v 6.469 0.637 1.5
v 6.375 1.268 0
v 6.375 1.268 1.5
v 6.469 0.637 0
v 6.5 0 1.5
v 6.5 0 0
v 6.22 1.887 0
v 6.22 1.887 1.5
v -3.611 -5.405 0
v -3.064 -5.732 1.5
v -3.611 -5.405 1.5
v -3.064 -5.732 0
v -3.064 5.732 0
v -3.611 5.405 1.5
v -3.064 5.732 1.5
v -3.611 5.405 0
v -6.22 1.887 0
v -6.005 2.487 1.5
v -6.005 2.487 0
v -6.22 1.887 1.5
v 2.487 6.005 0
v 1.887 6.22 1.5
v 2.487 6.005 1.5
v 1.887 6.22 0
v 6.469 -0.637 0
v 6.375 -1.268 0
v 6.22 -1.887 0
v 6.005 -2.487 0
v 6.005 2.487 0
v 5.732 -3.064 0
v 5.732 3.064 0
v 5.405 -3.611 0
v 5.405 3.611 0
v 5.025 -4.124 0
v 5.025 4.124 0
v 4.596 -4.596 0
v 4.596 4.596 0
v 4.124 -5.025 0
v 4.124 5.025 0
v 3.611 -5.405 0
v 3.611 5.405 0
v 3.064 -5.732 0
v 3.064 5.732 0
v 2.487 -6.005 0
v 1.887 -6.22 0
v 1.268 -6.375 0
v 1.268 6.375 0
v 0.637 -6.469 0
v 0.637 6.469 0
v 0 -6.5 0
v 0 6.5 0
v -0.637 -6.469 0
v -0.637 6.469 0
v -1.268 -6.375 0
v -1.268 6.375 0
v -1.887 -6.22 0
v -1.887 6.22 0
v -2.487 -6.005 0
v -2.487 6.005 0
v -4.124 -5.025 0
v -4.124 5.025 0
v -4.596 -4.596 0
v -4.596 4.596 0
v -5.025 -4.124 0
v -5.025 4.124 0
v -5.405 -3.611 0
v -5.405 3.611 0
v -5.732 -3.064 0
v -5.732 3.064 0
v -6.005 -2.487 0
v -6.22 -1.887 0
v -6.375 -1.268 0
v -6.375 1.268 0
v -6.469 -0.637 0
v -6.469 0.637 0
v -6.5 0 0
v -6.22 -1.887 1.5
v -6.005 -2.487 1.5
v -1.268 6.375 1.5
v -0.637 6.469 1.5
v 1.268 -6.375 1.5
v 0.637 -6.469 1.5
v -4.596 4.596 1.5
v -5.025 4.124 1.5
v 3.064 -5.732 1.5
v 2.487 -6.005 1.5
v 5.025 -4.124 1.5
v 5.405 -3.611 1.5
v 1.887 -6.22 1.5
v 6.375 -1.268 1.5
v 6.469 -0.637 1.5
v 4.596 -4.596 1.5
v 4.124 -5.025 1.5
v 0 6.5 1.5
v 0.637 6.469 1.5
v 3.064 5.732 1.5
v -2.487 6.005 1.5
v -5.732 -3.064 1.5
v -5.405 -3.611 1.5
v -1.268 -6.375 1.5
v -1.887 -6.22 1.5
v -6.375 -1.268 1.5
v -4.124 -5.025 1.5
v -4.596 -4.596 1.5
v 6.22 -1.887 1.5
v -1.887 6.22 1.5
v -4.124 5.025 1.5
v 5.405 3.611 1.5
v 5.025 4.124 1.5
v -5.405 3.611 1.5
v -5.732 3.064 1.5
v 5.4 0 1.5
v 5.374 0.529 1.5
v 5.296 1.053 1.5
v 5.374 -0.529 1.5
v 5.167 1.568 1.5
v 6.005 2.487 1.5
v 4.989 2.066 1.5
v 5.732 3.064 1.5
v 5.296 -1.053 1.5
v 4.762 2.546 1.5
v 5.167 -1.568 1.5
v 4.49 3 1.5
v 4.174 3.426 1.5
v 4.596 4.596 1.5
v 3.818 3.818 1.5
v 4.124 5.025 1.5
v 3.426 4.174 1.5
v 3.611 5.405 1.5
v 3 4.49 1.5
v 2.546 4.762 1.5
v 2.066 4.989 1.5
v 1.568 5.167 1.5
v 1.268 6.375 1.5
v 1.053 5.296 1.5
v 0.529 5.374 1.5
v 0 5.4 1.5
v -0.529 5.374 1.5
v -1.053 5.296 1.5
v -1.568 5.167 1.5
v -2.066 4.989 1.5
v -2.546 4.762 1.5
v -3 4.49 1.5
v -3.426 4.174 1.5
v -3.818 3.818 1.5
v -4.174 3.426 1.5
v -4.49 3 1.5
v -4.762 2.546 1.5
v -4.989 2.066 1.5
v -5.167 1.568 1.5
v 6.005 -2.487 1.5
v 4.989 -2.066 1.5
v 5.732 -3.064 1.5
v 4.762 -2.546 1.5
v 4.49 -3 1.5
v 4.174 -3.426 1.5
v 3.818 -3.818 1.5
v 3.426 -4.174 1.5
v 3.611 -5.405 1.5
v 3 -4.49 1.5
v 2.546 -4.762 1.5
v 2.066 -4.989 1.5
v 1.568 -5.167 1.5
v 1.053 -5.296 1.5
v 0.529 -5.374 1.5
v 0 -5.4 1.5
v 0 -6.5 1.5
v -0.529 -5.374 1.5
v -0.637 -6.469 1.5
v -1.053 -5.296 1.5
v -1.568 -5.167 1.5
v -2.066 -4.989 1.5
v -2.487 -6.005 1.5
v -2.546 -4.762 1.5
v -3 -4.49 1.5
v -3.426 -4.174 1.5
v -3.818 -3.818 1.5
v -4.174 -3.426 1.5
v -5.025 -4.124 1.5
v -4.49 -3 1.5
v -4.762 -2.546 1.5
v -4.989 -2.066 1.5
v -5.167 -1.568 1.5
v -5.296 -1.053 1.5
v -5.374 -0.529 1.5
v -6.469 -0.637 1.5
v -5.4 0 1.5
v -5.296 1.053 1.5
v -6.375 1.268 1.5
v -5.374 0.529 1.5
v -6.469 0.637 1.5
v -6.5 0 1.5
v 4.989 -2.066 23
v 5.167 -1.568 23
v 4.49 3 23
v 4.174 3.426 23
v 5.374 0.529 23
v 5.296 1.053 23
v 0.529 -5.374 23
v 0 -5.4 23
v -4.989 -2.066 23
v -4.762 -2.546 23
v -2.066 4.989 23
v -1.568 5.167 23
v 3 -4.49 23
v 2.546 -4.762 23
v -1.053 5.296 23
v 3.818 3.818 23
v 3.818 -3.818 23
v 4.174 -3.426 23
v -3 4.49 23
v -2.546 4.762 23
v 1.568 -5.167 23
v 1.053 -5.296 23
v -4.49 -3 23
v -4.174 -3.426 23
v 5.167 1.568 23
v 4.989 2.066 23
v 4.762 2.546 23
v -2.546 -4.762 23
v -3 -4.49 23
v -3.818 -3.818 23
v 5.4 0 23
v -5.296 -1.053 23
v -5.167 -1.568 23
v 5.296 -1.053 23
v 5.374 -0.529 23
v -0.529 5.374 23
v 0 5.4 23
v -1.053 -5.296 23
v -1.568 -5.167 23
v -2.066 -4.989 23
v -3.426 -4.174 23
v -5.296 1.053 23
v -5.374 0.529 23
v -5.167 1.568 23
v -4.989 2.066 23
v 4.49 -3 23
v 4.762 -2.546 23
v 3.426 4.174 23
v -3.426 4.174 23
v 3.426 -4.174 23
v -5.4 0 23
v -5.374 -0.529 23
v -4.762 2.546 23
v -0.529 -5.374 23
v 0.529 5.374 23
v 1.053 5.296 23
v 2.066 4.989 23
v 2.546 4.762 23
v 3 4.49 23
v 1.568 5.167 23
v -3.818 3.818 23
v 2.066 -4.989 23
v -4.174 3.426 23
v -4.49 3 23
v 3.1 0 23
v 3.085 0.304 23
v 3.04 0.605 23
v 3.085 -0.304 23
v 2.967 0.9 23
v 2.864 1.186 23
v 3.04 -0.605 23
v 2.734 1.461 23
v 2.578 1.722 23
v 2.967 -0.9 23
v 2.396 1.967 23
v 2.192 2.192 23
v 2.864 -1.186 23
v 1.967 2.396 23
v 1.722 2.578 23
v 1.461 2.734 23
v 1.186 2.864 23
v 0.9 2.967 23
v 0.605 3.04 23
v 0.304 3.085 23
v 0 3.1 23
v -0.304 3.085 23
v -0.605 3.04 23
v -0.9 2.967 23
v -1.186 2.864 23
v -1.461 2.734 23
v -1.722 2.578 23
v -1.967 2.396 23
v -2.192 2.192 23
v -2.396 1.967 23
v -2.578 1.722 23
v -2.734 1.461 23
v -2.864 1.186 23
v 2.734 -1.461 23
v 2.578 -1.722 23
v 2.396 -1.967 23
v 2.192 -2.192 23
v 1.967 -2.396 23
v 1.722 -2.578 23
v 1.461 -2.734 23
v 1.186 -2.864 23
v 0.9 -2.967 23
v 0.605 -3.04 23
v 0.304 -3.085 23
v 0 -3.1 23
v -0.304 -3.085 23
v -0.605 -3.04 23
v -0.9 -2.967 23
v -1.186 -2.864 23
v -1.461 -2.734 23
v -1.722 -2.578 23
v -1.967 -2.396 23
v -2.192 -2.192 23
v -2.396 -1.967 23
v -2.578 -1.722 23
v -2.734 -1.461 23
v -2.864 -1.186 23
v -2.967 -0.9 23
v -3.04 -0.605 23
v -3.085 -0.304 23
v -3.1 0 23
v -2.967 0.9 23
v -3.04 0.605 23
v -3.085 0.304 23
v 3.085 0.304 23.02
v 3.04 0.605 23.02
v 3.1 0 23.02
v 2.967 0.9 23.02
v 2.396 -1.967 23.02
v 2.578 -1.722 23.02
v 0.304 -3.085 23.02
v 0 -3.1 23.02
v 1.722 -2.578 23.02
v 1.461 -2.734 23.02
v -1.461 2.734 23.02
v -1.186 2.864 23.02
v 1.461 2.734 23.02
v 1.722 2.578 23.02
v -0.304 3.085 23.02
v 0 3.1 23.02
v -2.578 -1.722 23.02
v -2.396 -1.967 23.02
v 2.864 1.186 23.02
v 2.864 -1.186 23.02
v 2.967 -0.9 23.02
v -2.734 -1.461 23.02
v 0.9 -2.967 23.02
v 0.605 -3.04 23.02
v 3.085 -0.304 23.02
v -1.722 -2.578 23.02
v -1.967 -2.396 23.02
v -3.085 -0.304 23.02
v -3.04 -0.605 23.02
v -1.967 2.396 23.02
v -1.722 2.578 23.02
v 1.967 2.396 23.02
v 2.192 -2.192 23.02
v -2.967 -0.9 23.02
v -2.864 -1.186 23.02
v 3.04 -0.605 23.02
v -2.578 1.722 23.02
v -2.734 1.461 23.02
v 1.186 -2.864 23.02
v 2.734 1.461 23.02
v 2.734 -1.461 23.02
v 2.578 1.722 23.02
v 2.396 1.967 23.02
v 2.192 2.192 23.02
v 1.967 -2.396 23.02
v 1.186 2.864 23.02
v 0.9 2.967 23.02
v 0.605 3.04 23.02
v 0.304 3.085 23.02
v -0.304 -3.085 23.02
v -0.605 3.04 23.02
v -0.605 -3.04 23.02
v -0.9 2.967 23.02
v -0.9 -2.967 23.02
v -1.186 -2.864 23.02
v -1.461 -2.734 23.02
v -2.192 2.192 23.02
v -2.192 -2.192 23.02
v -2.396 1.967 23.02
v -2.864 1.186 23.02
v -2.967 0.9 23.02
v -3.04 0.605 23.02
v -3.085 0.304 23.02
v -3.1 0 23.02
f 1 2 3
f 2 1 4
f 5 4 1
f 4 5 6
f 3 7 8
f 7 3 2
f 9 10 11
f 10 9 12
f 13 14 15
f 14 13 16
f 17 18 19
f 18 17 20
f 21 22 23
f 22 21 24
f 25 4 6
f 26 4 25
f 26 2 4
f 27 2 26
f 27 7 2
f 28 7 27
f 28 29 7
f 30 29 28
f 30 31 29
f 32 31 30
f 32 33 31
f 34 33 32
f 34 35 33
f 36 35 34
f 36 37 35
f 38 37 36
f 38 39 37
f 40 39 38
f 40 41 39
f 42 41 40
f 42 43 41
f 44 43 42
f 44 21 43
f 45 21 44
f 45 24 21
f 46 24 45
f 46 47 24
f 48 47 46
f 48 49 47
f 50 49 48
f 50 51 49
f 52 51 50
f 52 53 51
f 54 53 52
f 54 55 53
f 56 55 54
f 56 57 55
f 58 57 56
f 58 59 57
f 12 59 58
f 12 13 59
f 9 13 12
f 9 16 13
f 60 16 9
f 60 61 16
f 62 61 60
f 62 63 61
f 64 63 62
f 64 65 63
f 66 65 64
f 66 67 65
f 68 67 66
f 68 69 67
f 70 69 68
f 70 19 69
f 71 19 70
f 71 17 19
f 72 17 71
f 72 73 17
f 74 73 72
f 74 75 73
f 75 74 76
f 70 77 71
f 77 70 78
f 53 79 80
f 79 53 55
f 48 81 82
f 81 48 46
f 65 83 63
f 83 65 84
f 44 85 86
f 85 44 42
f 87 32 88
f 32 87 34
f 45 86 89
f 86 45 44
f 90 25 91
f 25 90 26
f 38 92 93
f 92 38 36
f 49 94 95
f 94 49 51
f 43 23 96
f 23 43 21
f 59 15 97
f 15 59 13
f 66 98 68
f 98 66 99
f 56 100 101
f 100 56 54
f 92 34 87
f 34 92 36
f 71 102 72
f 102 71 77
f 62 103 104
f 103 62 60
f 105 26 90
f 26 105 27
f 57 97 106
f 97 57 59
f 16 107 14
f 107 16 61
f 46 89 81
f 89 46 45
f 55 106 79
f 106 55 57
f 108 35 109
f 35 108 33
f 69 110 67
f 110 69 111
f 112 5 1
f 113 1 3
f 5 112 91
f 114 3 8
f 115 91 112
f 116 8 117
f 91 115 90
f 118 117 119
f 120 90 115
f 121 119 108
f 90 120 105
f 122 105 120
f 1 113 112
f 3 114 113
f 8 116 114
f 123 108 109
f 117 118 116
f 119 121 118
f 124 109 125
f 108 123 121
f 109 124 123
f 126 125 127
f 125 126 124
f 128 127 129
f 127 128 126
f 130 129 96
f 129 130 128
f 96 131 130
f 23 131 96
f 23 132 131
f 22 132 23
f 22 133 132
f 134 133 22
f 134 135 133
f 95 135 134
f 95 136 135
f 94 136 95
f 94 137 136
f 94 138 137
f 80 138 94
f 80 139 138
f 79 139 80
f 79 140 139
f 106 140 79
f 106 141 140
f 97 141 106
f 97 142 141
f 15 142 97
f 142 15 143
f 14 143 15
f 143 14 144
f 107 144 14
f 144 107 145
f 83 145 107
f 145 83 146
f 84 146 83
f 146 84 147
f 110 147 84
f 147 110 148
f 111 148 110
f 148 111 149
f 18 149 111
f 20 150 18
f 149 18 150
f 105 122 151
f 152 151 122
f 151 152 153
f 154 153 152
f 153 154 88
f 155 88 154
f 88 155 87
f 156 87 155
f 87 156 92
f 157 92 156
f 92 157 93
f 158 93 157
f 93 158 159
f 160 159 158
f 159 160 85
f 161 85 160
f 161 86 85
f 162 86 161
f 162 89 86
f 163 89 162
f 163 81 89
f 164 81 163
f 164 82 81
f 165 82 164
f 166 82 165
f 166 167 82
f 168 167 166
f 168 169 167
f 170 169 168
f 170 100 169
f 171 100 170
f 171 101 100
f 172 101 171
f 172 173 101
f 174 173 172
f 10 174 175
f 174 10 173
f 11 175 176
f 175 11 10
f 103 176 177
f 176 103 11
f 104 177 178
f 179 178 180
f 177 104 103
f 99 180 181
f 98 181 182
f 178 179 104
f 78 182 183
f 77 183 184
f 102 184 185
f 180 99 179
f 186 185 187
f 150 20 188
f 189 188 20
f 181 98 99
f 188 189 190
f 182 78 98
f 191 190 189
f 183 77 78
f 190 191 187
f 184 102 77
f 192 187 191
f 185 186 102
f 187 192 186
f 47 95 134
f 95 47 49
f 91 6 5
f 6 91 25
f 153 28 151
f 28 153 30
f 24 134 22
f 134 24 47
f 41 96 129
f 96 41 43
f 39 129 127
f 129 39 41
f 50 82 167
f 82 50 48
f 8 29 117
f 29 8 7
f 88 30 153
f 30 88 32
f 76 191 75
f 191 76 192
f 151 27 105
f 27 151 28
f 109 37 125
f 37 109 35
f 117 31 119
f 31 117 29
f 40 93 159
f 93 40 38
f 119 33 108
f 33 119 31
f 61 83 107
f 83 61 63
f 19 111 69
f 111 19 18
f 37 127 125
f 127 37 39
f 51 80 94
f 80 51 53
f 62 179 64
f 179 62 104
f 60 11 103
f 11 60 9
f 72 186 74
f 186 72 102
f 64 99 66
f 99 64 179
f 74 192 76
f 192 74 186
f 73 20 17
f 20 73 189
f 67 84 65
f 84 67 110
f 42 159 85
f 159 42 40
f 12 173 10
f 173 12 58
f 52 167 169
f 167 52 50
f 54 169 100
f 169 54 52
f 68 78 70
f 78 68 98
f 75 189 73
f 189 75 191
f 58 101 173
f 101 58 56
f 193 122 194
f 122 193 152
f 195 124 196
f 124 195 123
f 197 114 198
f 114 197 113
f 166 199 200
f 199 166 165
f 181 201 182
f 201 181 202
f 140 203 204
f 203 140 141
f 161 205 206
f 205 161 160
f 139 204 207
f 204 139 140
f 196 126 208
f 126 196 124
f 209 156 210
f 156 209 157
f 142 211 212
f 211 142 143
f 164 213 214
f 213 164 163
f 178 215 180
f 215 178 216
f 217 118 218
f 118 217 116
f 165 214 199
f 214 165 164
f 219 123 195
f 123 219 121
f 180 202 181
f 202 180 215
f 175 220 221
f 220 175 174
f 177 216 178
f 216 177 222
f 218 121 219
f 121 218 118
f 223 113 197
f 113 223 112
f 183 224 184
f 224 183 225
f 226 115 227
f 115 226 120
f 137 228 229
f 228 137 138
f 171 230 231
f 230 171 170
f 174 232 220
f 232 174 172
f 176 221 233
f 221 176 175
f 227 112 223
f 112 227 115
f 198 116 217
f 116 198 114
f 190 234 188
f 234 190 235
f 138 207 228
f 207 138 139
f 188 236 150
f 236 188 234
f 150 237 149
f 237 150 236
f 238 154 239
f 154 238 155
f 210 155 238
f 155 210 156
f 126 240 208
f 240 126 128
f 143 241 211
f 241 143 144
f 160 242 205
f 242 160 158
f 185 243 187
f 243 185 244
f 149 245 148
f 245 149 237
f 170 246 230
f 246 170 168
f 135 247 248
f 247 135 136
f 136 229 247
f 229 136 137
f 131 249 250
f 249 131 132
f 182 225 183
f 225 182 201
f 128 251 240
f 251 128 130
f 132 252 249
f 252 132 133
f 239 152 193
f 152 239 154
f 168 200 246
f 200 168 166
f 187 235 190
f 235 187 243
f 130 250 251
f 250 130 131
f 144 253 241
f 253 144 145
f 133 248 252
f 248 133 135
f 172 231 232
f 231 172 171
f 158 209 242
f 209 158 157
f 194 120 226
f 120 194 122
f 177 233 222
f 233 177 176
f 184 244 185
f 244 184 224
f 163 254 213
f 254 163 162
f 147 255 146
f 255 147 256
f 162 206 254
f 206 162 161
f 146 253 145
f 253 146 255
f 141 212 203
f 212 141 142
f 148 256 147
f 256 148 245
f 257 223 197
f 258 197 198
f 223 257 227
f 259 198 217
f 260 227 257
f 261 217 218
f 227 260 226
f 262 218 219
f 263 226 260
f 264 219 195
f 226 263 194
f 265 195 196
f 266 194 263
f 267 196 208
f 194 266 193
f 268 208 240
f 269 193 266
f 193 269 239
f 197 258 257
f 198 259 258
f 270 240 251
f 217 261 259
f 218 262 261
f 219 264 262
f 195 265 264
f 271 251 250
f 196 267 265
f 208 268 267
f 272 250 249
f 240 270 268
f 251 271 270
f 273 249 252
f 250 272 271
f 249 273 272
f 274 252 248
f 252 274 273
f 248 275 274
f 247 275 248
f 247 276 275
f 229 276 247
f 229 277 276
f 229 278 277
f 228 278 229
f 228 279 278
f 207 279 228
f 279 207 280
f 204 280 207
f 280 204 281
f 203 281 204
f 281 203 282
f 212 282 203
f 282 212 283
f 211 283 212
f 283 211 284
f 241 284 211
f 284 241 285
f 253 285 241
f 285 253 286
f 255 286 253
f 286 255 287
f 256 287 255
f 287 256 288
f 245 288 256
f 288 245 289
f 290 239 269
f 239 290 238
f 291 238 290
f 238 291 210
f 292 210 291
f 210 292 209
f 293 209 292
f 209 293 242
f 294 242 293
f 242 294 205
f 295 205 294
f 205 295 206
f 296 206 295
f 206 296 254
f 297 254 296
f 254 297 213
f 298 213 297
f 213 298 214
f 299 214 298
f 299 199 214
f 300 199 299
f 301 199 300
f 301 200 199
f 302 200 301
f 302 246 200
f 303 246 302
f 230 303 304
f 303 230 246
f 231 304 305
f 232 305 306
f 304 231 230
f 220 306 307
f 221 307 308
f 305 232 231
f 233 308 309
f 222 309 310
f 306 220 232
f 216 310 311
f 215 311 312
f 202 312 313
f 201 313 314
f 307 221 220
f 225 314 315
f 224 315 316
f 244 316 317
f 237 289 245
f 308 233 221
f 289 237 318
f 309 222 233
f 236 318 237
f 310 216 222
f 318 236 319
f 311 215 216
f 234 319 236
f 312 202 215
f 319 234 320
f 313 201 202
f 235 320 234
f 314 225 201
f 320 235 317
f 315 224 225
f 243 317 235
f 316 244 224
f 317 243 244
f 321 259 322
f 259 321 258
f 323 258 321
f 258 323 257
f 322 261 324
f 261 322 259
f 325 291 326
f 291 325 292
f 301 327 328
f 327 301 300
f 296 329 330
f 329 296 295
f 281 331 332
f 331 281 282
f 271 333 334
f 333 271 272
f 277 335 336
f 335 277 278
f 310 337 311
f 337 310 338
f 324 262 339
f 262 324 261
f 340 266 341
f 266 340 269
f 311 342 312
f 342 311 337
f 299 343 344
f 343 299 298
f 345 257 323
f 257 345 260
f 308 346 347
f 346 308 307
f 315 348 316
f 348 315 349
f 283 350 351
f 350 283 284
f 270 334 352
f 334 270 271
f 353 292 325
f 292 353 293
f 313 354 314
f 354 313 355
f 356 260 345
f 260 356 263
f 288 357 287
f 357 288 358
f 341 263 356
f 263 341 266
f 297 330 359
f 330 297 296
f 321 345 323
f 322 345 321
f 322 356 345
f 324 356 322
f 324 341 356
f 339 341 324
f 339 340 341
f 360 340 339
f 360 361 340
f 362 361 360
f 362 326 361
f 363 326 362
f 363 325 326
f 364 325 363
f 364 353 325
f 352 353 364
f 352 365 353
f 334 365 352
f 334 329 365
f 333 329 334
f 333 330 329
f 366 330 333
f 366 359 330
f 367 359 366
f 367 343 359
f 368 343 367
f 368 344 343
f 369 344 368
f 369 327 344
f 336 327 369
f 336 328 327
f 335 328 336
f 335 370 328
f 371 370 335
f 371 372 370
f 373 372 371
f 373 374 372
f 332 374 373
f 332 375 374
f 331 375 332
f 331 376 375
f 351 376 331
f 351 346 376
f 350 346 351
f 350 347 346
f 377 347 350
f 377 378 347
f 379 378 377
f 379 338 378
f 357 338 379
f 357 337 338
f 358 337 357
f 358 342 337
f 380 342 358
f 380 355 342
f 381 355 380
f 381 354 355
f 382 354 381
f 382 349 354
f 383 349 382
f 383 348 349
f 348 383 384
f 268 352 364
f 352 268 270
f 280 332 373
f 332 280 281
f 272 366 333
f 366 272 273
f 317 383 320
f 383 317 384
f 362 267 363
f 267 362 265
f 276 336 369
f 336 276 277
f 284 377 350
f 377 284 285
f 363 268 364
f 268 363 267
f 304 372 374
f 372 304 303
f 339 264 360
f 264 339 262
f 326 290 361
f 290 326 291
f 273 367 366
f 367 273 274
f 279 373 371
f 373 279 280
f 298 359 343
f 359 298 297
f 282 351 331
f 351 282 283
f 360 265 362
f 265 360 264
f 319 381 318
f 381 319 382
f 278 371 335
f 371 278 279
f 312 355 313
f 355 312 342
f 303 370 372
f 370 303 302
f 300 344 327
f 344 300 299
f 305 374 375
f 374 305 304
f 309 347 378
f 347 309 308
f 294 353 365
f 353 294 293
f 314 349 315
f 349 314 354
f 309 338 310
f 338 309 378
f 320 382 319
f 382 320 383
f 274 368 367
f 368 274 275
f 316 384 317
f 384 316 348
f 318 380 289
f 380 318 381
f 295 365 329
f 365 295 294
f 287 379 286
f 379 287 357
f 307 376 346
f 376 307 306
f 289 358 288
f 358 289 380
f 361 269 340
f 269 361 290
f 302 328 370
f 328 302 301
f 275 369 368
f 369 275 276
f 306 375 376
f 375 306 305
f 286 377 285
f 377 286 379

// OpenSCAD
// Dimensions for 0.2 mL PCR Tube Adapter
// Units: mm

// Outer Diameter of the main sleeve body
sleeve_od = 10.8;
// Diameter of the collar that sits on the bed
collar_od = 13.0;
// Height of the collar (thickness)
collar_height = 1.5;
// Total height of the sleeve body
sleeve_height = 21.5;
// Diameter of the bore (hole) for the tube
bore_diameter = 6.2;
// Wall thickness of the sleeve
wall_thickness = (sleeve_od - bore_diameter) / 2;

// Rendering settings
$fn = 64;

module main() {
    // The part is built on the XY plane (z=0) and grows upwards.
    
    // 1. The Base Collar
    // A flat disc that sits on the bed (bottom at z=0)
    cylinder(d = collar_od, h = collar_height);
    
    // 2. The Main Sleeve Body
    // Extrudes from the top of the collar to the full height
    // Adjusted height so the bottom of the body is at z=0
    translate([0, 0, collar_height])
        cylinder(d = sleeve_od, h = sleeve_height);
    
    // 3. The Bore
    // A cylinder cut through the entire part
    // Extends 0.01mm past the top and bottom faces to ensure clean cuts
    cylinder(d = bore_diameter, h = sleeve_height + collar_height + 0.02);
}

// Render the part
main();
